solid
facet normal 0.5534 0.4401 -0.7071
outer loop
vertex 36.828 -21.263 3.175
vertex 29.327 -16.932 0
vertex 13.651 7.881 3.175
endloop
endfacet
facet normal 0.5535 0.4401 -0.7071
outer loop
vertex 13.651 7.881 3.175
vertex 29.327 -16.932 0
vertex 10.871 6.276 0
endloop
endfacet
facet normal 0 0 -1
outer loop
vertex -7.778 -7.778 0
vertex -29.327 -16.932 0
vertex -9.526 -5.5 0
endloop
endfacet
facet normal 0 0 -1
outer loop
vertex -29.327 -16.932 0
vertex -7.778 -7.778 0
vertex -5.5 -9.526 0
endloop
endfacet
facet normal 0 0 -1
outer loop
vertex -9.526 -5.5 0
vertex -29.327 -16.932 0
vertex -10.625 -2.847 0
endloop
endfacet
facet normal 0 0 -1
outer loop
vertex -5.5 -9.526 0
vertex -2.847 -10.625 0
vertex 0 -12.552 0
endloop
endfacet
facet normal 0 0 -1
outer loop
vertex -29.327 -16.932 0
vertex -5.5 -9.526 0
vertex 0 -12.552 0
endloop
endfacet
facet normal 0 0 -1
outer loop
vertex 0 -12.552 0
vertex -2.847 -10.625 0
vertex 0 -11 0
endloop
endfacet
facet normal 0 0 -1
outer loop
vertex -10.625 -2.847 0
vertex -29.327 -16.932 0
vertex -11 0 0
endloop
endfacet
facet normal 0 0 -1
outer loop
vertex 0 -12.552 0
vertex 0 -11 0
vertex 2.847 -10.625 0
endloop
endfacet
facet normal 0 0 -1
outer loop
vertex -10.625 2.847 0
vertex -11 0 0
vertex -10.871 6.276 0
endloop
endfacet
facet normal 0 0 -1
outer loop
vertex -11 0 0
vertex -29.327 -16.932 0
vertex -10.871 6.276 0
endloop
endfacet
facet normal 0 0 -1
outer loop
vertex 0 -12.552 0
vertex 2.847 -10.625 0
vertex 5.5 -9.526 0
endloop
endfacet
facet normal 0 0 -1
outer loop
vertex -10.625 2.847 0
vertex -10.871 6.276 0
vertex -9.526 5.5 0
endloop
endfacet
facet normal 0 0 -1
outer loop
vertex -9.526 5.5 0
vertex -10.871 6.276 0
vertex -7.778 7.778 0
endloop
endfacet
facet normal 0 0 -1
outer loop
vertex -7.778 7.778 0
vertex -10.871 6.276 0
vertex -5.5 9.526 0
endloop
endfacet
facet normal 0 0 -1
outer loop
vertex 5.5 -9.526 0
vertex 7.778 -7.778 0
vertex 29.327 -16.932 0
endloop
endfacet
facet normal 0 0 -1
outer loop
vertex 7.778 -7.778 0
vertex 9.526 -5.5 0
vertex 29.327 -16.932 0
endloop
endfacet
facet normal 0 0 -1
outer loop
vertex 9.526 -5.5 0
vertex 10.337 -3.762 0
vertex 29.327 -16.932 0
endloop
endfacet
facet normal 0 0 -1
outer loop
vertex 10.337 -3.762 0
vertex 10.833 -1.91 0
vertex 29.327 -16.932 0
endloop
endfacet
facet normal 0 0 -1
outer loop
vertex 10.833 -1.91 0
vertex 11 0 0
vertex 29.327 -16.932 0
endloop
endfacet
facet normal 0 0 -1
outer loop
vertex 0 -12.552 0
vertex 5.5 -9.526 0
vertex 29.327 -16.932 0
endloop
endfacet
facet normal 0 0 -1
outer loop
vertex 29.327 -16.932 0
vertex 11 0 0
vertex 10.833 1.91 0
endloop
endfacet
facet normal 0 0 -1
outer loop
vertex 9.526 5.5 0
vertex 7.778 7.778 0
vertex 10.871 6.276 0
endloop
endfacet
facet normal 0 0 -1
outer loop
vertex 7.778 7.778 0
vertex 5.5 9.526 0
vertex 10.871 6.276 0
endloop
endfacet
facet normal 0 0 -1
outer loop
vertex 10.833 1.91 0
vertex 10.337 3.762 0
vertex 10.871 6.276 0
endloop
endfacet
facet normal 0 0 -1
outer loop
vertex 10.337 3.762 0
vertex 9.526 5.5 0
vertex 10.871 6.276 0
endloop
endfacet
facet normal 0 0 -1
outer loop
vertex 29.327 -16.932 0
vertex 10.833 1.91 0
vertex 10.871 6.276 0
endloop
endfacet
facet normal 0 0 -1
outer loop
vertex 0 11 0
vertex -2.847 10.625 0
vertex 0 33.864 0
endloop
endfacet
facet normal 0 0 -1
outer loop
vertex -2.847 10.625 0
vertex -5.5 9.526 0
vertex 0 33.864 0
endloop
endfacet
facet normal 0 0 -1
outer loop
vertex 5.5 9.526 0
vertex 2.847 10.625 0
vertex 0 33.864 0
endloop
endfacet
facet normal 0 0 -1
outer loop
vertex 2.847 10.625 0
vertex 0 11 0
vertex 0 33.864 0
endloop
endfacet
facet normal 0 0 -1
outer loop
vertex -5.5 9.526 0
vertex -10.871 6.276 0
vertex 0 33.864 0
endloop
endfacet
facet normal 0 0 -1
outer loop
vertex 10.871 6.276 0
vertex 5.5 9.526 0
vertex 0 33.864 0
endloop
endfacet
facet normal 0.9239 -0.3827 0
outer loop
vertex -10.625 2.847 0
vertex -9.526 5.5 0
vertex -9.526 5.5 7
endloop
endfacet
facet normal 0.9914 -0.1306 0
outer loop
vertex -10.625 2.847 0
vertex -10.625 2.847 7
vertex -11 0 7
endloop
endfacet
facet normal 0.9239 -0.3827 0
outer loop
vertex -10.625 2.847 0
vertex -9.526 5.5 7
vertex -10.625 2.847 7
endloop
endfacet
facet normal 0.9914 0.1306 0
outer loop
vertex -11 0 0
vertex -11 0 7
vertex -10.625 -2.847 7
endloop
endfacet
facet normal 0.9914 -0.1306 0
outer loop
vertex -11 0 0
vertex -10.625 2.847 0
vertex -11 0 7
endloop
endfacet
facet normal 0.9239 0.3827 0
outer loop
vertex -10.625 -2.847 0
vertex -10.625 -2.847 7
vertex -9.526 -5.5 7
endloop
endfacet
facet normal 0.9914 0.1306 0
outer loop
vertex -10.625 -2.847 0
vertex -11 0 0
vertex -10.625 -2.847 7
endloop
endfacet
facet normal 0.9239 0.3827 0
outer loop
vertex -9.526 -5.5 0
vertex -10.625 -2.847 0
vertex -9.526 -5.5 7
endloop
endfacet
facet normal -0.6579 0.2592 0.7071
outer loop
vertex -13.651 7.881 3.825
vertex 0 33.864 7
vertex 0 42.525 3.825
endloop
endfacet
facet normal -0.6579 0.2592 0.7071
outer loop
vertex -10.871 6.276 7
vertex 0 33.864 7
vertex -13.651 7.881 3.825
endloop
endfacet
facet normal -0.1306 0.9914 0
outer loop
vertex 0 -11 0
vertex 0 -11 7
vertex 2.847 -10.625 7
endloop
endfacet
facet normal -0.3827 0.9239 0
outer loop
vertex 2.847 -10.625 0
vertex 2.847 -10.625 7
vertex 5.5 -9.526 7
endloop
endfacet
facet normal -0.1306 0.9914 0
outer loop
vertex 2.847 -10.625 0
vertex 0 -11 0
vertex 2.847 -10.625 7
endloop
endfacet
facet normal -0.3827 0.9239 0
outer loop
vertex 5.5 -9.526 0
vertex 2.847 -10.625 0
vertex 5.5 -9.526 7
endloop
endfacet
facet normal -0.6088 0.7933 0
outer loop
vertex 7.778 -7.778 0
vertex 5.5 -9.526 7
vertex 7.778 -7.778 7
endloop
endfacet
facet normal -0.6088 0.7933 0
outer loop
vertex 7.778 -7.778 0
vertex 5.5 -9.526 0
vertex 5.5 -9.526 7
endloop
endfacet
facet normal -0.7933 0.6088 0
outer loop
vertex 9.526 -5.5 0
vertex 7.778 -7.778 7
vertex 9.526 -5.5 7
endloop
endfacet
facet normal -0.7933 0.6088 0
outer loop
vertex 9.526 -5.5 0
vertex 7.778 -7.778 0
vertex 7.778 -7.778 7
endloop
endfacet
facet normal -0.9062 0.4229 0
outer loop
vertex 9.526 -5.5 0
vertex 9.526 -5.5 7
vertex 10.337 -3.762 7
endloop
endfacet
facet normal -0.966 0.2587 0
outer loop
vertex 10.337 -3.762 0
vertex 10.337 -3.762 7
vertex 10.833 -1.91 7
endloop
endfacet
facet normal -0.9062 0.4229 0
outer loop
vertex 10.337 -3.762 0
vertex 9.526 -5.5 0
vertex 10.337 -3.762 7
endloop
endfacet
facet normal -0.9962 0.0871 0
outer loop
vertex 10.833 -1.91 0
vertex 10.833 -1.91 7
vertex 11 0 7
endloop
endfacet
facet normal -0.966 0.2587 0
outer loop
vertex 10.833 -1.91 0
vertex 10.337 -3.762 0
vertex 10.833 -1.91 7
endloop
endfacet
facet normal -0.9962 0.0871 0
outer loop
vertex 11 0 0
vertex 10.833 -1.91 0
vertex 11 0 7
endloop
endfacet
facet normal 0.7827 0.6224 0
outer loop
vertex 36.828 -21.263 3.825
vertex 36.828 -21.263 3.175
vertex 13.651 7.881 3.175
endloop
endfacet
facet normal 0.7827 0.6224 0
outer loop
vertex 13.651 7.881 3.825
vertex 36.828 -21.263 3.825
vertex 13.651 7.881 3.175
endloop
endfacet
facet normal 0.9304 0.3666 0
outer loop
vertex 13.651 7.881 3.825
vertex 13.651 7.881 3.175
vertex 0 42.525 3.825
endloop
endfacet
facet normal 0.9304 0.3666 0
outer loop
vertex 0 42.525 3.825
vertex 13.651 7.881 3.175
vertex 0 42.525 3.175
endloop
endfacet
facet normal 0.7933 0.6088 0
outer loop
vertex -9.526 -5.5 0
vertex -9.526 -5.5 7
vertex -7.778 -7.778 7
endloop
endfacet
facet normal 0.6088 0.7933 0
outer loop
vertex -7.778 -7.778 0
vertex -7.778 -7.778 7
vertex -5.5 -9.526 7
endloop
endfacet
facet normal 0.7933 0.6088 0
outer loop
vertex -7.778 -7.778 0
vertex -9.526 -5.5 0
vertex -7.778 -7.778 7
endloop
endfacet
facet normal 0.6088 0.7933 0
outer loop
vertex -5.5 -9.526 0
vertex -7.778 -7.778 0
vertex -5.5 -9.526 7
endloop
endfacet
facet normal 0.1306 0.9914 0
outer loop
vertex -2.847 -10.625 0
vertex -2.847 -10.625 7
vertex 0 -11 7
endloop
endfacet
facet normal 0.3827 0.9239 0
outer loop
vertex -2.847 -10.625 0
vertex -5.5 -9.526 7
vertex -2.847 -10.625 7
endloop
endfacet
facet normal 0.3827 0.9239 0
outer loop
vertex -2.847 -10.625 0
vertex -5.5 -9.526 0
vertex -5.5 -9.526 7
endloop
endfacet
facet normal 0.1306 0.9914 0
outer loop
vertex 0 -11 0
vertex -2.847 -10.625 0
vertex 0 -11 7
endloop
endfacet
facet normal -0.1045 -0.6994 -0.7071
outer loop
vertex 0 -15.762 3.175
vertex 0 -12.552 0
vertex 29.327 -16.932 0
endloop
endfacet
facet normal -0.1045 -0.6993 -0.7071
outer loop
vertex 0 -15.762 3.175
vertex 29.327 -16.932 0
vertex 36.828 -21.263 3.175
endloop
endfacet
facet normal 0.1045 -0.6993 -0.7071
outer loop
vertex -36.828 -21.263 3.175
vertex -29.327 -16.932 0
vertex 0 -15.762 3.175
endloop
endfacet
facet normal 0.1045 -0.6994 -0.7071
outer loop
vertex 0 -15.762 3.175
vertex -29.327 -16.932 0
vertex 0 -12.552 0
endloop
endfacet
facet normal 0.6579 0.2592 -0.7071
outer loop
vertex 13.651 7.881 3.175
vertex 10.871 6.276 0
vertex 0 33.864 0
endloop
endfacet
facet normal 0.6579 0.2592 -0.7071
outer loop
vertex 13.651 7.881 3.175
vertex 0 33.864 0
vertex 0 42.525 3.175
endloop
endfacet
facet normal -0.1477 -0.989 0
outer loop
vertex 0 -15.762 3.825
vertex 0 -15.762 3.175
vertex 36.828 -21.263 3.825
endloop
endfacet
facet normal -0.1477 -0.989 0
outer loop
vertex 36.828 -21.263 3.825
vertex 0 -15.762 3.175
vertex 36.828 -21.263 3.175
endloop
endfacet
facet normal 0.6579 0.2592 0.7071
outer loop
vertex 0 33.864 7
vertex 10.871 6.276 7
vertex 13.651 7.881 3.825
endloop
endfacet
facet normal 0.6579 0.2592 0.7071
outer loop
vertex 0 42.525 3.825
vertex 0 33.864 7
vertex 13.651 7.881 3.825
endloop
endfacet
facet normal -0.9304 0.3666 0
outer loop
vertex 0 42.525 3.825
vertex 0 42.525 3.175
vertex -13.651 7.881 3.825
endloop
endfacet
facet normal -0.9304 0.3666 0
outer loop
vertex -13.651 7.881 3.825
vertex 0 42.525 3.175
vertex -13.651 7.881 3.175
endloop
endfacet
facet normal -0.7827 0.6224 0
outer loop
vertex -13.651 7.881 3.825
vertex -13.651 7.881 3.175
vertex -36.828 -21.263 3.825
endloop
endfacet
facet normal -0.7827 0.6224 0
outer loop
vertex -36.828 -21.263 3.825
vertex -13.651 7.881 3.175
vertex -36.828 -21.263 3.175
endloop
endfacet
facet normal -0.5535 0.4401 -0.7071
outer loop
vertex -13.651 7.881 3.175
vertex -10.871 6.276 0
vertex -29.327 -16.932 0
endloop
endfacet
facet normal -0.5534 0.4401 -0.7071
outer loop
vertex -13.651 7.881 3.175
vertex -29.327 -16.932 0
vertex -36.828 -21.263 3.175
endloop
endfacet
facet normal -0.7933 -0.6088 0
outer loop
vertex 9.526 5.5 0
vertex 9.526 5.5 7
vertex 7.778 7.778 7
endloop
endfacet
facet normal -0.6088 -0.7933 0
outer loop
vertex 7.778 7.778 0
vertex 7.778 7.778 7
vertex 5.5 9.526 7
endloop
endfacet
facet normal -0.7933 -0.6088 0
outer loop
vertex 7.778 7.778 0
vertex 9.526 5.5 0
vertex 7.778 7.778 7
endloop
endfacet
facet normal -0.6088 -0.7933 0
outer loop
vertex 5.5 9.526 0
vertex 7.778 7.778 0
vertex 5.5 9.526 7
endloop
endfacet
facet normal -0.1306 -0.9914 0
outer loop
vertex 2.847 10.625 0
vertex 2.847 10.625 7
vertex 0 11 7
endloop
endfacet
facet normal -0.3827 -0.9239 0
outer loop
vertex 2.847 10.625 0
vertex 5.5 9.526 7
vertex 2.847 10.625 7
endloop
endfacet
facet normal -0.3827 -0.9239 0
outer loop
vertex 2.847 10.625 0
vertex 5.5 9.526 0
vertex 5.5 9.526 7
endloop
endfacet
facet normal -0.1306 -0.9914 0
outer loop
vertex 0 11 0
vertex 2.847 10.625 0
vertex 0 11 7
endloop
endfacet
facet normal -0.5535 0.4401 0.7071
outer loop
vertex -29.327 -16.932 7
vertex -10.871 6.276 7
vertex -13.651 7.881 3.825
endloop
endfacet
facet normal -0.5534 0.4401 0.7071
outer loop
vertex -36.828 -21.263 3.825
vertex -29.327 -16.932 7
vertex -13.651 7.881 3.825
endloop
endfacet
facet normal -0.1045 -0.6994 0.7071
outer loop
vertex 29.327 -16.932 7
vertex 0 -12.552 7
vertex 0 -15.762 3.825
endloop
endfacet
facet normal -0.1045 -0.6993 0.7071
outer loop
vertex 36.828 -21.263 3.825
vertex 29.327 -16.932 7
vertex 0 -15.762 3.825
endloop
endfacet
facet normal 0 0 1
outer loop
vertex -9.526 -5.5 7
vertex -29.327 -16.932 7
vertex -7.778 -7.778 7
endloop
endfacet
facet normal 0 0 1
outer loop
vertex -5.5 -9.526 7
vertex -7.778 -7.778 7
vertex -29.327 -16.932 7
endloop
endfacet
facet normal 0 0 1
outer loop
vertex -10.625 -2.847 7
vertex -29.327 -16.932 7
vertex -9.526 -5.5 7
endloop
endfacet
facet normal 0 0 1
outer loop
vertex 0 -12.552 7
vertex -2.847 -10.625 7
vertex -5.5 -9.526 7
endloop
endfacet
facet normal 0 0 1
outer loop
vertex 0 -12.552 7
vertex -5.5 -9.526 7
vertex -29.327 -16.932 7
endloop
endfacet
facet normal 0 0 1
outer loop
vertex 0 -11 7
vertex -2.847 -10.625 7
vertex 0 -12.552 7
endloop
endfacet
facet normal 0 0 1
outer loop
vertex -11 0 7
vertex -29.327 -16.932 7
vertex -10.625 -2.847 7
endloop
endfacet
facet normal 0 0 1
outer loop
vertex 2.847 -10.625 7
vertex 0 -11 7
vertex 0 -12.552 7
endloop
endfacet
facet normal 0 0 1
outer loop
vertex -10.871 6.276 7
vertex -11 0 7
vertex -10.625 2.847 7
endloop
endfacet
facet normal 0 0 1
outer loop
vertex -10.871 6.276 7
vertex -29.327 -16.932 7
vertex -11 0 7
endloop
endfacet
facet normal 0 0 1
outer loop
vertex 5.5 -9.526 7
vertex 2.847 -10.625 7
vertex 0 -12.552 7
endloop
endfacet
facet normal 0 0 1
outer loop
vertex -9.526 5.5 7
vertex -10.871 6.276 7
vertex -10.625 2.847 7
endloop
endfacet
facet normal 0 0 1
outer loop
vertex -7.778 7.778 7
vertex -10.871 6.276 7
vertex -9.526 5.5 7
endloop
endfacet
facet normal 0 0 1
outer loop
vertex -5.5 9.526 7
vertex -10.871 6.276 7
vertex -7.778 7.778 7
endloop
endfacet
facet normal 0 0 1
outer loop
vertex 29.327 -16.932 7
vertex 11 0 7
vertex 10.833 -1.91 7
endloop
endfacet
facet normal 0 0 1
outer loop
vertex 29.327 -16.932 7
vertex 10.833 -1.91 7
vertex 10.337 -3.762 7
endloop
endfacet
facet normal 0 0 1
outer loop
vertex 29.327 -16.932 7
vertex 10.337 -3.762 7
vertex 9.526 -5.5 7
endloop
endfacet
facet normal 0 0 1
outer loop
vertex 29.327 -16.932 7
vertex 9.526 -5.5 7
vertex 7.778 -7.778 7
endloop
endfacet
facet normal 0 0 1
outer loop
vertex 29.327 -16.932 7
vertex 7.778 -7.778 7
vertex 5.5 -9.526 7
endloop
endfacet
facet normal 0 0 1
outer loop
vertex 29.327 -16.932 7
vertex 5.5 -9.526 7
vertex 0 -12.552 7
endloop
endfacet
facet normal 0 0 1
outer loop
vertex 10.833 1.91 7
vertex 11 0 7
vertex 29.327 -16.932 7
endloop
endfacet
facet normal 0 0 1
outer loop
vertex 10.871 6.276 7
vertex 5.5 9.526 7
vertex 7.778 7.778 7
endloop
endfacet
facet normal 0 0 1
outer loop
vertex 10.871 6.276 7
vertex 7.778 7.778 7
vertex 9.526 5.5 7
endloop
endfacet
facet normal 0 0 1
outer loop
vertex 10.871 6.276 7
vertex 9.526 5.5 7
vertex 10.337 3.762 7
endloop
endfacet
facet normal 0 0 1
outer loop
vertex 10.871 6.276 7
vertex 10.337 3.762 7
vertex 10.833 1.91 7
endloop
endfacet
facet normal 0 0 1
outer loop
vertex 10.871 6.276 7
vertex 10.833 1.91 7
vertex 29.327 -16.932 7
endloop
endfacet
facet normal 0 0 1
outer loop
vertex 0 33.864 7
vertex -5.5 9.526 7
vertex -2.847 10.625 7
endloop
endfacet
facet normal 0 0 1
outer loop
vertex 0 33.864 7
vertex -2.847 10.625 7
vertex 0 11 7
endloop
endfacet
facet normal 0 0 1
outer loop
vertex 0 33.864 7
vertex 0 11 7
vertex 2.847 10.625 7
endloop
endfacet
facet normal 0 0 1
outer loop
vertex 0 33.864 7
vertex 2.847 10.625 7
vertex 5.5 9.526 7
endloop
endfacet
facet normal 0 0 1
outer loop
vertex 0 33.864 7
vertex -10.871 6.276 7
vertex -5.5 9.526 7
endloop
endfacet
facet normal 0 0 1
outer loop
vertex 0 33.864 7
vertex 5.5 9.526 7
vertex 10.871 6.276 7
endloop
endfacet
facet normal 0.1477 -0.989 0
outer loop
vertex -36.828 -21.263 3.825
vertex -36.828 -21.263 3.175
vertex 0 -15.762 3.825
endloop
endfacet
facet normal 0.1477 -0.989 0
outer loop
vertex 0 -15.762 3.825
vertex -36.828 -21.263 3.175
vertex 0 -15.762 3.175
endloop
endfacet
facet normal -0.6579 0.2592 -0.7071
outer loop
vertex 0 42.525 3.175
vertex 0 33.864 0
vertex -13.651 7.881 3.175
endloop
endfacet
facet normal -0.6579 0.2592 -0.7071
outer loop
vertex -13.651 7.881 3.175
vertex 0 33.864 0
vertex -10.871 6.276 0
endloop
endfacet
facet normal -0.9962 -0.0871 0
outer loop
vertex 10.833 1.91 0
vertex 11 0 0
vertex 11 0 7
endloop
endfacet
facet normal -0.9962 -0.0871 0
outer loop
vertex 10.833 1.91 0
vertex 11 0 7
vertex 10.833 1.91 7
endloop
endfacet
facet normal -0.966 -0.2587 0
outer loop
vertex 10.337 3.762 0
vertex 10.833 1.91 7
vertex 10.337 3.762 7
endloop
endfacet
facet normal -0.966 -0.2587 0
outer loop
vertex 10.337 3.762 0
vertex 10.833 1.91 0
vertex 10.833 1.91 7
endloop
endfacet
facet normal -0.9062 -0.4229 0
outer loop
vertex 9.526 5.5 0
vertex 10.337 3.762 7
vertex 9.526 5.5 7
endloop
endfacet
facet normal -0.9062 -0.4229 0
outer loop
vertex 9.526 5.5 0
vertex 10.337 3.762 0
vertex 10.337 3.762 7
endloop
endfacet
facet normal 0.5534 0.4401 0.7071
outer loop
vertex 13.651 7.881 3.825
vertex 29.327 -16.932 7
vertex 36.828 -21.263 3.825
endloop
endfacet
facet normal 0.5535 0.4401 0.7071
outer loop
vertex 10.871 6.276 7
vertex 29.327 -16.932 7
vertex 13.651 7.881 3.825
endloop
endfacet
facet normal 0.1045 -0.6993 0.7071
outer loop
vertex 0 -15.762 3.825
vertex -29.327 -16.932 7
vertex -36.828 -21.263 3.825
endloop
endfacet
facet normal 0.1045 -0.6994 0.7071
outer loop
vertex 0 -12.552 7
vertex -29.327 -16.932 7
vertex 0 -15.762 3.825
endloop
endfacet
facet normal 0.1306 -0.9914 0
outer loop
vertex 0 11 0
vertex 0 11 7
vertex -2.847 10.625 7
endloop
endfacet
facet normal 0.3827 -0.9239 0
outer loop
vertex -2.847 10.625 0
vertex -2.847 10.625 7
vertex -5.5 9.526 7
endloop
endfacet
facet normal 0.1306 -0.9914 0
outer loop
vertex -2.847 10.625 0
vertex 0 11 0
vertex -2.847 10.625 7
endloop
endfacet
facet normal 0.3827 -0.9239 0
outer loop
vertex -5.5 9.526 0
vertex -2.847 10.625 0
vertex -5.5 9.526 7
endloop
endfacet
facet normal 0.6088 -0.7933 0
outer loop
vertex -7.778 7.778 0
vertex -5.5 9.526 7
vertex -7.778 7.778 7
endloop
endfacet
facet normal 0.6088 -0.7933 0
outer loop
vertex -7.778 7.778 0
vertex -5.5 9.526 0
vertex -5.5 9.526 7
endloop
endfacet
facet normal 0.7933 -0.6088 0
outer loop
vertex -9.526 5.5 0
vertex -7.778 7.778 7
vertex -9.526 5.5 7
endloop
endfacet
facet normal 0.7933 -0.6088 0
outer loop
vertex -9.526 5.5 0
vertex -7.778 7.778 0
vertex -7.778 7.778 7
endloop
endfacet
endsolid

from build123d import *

# Parameters (mm, degrees)
F1_DEPTH = 7
F2_SIZE  = 3.175
F3_DEPTH = 7.001


with BuildPart() as f1:
    # F0 (on Top) → F1 (new body)
    with BuildSketch(Plane.XY):
        with BuildLine():
            Line((13.6507254272, 7.88125), (0, 42.5250102))
            Line((0, 42.5250102), (0, 15.7625))
            ThreePointArc((0, 15.7625), (7.88125, 13.6507254272), (13.6507254272, 7.88125))
        make_face()
        with BuildLine():
            Line((0, 15.7625), (0, 42.5250102))
            Line((0, 42.5250102), (-13.6507254272, 7.88125))
            ThreePointArc((-13.6507254272, 7.88125), (-7.88125, 13.6507254272), (0, 15.7625))
        make_face()
        with BuildLine():
            ThreePointArc((-13.6507254272, -7.88125), (-15.7625, 0), (-13.6507254272, 7.88125))
            Line((-13.6507254272, 7.88125), (-36.8277391294, -21.2625051))
            Line((-36.8277391294, -21.2625051), (-13.6507254272, -7.88125))
        make_face()
        with BuildLine():
            Line((-36.8277391294, -21.2625051), (0, -15.7625))
            ThreePointArc((0, -15.7625), (-7.88125, -13.6507254272), (-13.6507254272, -7.88125))
            Line((-13.6507254272, -7.88125), (-36.8277391294, -21.2625051))
        make_face()
        with BuildLine():
            Line((0, -15.7625), (36.8277391294, -21.2625051))
            Line((36.8277391294, -21.2625051), (13.6507254272, -7.88125))
            ThreePointArc((13.6507254272, -7.88125), (7.88125, -13.6507254272), (0, -15.7625))
        make_face()
        with BuildLine():
            Line((13.6507254272, -7.88125), (36.8277391294, -21.2625051))
            Line((36.8277391294, -21.2625051), (13.6507254272, 7.88125))
            ThreePointArc((13.6507254272, 7.88125), (15.2254058369, 4.0796351984), (15.7625, 0))
            ThreePointArc((15.7625, 0), (15.2254058369, -4.0796351984), (13.6507254272, -7.88125))
        make_face()
        with BuildLine():
            Line((0, 11), (0, 15.7625))
            ThreePointArc((0, 15.7625), (-7.88125, 13.6507254272), (-13.6507254272, 7.88125))
            Line((-13.6507254272, 7.88125), (-9.5262794416, 5.5))
            ThreePointArc((-9.5262794416, 5.5), (-5.5, 9.5262794416), (0, 11))
        make_face()
        with BuildLine():
            Line((9.5262794416, 5.5), (13.6507254272, 7.88125))
            ThreePointArc((13.6507254272, 7.88125), (7.88125, 13.6507254272), (0, 15.7625))
            Line((0, 15.7625), (0, 11))
            ThreePointArc((0, 11), (5.5, 9.5262794416), (9.5262794416, 5.5))
        make_face()
        with BuildLine():
            ThreePointArc((15.7625, 0), (15.2254058369, 4.0796351984), (13.6507254272, 7.88125))
            Line((13.6507254272, 7.88125), (9.5262794416, 5.5))
            ThreePointArc((9.5262794416, 5.5), (10.6251840892, 2.8470094961), (11, 0))
            ThreePointArc((11, 0), (10.6251840892, -2.8470094961), (9.5262794416, -5.5))
            Line((9.5262794416, -5.5), (13.6507254272, -7.88125))
            ThreePointArc((13.6507254272, -7.88125), (15.2254058369, -4.0796351984), (15.7625, 0))
        make_face()
        with BuildLine():
            ThreePointArc((0, -15.7625), (7.88125, -13.6507254272), (13.6507254272, -7.88125))
            Line((13.6507254272, -7.88125), (9.5262794416, -5.5))
            ThreePointArc((9.5262794416, -5.5), (5.5, -9.5262794416), (0, -11))
            Line((0, -11), (0, -15.7625))
        make_face()
        with BuildLine():
            ThreePointArc((-13.6507254272, -7.88125), (-7.88125, -13.6507254272), (0, -15.7625))
            Line((0, -15.7625), (0, -11))
            ThreePointArc((0, -11), (-5.5, -9.5262794416), (-9.5262794416, -5.5))
            Line((-9.5262794416, -5.5), (-13.6507254272, -7.88125))
        make_face()
        with BuildLine():
            Line((-9.5262794416, 5.5), (-13.6507254272, 7.88125))
            ThreePointArc((-13.6507254272, 7.88125), (-15.7625, 0), (-13.6507254272, -7.88125))
            Line((-13.6507254272, -7.88125), (-9.5262794416, -5.5))
            ThreePointArc((-9.5262794416, -5.5), (-11, 0), (-9.5262794416, 5.5))
        make_face()
        with BuildLine():
            Line((0, 0), (-9.5262794416, 5.5))
            ThreePointArc((-9.5262794416, 5.5), (-11, 0), (-9.5262794416, -5.5))
            Line((-9.5262794416, -5.5), (0, 0))
        make_face()
        with BuildLine():
            ThreePointArc((-9.5262794416, -5.5), (-5.5, -9.5262794416), (0, -11))
            Line((0, -11), (0, 0))
            Line((0, 0), (-9.5262794416, -5.5))
        make_face()
        with BuildLine():
            ThreePointArc((0, -11), (5.5, -9.5262794416), (9.5262794416, -5.5))
            Line((9.5262794416, -5.5), (0, 0))
            Line((0, 0), (0, -11))
        make_face()
        with BuildLine():
            ThreePointArc((11, 0), (10.6251840892, 2.8470094961), (9.5262794416, 5.5))
            Line((9.5262794416, 5.5), (0, 0))
            Line((0, 0), (9.5262794416, -5.5))
            ThreePointArc((9.5262794416, -5.5), (10.6251840892, -2.8470094961), (11, 0))
        make_face()
        with BuildLine():
            Line((0, 0), (9.5262794416, 5.5))
            ThreePointArc((9.5262794416, 5.5), (5.5, 9.5262794416), (0, 11))
            Line((0, 11), (0, 0))
        make_face()
        with BuildLine():
            Line((0, 0), (0, 11))
            ThreePointArc((0, 11), (-5.5, 9.5262794416), (-9.5262794416, 5.5))
            Line((-9.5262794416, 5.5), (0, 0))
        make_face()
    extrude(amount=F1_DEPTH)

    # F2
    f2_edges = [f1.edges().sort_by_distance(p)[0] for p in [
        (-18.41387, -18.512503, 7),
        (-6.825363, 25.20313, 7),
        (-25.239232, -6.690628, 7),
        (18.41387, -18.512503, 7),
        (25.239232, -6.690628, 7),
        (6.825363, 25.20313, 7),
        (-6.825363, 25.20313, 0),
        (-25.239232, -6.690628, 0),
        (-18.41387, -18.512503, 0),
        (18.41387, -18.512503, 0),
        (25.239232, -6.690628, 0),
        (6.825363, 25.20313, 0),
    ]]
    chamfer(f2_edges, length=F2_SIZE)

    # F0 (on Top) → F3 (cut, through all)
    with BuildSketch(Plane.XY):
        with BuildLine():
            ThreePointArc((0, -11), (5.5, -9.5262794416), (9.5262794416, -5.5))
            Line((9.5262794416, -5.5), (0, 0))
            Line((0, 0), (0, -11))
        make_face()
        with BuildLine():
            ThreePointArc((-9.5262794416, -5.5), (-5.5, -9.5262794416), (0, -11))
            Line((0, -11), (0, 0))
            Line((0, 0), (-9.5262794416, -5.5))
        make_face()
        with BuildLine():
            Line((0, 0), (-9.5262794416, 5.5))
            ThreePointArc((-9.5262794416, 5.5), (-11, 0), (-9.5262794416, -5.5))
            Line((-9.5262794416, -5.5), (0, 0))
        make_face()
        with BuildLine():
            Line((0, 0), (0, 11))
            ThreePointArc((0, 11), (-5.5, 9.5262794416), (-9.5262794416, 5.5))
            Line((-9.5262794416, 5.5), (0, 0))
        make_face()
        with BuildLine():
            Line((0, 0), (9.5262794416, 5.5))
            ThreePointArc((9.5262794416, 5.5), (5.5, 9.5262794416), (0, 11))
            Line((0, 11), (0, 0))
        make_face()
        with BuildLine():
            ThreePointArc((11, 0), (10.6251840892, 2.8470094961), (9.5262794416, 5.5))
            Line((9.5262794416, 5.5), (0, 0))
            Line((0, 0), (9.5262794416, -5.5))
            ThreePointArc((9.5262794416, -5.5), (10.6251840892, -2.8470094961), (11, 0))
        make_face()
    extrude(amount=F3_DEPTH, mode=Mode.SUBTRACT)


solid = f1.part
